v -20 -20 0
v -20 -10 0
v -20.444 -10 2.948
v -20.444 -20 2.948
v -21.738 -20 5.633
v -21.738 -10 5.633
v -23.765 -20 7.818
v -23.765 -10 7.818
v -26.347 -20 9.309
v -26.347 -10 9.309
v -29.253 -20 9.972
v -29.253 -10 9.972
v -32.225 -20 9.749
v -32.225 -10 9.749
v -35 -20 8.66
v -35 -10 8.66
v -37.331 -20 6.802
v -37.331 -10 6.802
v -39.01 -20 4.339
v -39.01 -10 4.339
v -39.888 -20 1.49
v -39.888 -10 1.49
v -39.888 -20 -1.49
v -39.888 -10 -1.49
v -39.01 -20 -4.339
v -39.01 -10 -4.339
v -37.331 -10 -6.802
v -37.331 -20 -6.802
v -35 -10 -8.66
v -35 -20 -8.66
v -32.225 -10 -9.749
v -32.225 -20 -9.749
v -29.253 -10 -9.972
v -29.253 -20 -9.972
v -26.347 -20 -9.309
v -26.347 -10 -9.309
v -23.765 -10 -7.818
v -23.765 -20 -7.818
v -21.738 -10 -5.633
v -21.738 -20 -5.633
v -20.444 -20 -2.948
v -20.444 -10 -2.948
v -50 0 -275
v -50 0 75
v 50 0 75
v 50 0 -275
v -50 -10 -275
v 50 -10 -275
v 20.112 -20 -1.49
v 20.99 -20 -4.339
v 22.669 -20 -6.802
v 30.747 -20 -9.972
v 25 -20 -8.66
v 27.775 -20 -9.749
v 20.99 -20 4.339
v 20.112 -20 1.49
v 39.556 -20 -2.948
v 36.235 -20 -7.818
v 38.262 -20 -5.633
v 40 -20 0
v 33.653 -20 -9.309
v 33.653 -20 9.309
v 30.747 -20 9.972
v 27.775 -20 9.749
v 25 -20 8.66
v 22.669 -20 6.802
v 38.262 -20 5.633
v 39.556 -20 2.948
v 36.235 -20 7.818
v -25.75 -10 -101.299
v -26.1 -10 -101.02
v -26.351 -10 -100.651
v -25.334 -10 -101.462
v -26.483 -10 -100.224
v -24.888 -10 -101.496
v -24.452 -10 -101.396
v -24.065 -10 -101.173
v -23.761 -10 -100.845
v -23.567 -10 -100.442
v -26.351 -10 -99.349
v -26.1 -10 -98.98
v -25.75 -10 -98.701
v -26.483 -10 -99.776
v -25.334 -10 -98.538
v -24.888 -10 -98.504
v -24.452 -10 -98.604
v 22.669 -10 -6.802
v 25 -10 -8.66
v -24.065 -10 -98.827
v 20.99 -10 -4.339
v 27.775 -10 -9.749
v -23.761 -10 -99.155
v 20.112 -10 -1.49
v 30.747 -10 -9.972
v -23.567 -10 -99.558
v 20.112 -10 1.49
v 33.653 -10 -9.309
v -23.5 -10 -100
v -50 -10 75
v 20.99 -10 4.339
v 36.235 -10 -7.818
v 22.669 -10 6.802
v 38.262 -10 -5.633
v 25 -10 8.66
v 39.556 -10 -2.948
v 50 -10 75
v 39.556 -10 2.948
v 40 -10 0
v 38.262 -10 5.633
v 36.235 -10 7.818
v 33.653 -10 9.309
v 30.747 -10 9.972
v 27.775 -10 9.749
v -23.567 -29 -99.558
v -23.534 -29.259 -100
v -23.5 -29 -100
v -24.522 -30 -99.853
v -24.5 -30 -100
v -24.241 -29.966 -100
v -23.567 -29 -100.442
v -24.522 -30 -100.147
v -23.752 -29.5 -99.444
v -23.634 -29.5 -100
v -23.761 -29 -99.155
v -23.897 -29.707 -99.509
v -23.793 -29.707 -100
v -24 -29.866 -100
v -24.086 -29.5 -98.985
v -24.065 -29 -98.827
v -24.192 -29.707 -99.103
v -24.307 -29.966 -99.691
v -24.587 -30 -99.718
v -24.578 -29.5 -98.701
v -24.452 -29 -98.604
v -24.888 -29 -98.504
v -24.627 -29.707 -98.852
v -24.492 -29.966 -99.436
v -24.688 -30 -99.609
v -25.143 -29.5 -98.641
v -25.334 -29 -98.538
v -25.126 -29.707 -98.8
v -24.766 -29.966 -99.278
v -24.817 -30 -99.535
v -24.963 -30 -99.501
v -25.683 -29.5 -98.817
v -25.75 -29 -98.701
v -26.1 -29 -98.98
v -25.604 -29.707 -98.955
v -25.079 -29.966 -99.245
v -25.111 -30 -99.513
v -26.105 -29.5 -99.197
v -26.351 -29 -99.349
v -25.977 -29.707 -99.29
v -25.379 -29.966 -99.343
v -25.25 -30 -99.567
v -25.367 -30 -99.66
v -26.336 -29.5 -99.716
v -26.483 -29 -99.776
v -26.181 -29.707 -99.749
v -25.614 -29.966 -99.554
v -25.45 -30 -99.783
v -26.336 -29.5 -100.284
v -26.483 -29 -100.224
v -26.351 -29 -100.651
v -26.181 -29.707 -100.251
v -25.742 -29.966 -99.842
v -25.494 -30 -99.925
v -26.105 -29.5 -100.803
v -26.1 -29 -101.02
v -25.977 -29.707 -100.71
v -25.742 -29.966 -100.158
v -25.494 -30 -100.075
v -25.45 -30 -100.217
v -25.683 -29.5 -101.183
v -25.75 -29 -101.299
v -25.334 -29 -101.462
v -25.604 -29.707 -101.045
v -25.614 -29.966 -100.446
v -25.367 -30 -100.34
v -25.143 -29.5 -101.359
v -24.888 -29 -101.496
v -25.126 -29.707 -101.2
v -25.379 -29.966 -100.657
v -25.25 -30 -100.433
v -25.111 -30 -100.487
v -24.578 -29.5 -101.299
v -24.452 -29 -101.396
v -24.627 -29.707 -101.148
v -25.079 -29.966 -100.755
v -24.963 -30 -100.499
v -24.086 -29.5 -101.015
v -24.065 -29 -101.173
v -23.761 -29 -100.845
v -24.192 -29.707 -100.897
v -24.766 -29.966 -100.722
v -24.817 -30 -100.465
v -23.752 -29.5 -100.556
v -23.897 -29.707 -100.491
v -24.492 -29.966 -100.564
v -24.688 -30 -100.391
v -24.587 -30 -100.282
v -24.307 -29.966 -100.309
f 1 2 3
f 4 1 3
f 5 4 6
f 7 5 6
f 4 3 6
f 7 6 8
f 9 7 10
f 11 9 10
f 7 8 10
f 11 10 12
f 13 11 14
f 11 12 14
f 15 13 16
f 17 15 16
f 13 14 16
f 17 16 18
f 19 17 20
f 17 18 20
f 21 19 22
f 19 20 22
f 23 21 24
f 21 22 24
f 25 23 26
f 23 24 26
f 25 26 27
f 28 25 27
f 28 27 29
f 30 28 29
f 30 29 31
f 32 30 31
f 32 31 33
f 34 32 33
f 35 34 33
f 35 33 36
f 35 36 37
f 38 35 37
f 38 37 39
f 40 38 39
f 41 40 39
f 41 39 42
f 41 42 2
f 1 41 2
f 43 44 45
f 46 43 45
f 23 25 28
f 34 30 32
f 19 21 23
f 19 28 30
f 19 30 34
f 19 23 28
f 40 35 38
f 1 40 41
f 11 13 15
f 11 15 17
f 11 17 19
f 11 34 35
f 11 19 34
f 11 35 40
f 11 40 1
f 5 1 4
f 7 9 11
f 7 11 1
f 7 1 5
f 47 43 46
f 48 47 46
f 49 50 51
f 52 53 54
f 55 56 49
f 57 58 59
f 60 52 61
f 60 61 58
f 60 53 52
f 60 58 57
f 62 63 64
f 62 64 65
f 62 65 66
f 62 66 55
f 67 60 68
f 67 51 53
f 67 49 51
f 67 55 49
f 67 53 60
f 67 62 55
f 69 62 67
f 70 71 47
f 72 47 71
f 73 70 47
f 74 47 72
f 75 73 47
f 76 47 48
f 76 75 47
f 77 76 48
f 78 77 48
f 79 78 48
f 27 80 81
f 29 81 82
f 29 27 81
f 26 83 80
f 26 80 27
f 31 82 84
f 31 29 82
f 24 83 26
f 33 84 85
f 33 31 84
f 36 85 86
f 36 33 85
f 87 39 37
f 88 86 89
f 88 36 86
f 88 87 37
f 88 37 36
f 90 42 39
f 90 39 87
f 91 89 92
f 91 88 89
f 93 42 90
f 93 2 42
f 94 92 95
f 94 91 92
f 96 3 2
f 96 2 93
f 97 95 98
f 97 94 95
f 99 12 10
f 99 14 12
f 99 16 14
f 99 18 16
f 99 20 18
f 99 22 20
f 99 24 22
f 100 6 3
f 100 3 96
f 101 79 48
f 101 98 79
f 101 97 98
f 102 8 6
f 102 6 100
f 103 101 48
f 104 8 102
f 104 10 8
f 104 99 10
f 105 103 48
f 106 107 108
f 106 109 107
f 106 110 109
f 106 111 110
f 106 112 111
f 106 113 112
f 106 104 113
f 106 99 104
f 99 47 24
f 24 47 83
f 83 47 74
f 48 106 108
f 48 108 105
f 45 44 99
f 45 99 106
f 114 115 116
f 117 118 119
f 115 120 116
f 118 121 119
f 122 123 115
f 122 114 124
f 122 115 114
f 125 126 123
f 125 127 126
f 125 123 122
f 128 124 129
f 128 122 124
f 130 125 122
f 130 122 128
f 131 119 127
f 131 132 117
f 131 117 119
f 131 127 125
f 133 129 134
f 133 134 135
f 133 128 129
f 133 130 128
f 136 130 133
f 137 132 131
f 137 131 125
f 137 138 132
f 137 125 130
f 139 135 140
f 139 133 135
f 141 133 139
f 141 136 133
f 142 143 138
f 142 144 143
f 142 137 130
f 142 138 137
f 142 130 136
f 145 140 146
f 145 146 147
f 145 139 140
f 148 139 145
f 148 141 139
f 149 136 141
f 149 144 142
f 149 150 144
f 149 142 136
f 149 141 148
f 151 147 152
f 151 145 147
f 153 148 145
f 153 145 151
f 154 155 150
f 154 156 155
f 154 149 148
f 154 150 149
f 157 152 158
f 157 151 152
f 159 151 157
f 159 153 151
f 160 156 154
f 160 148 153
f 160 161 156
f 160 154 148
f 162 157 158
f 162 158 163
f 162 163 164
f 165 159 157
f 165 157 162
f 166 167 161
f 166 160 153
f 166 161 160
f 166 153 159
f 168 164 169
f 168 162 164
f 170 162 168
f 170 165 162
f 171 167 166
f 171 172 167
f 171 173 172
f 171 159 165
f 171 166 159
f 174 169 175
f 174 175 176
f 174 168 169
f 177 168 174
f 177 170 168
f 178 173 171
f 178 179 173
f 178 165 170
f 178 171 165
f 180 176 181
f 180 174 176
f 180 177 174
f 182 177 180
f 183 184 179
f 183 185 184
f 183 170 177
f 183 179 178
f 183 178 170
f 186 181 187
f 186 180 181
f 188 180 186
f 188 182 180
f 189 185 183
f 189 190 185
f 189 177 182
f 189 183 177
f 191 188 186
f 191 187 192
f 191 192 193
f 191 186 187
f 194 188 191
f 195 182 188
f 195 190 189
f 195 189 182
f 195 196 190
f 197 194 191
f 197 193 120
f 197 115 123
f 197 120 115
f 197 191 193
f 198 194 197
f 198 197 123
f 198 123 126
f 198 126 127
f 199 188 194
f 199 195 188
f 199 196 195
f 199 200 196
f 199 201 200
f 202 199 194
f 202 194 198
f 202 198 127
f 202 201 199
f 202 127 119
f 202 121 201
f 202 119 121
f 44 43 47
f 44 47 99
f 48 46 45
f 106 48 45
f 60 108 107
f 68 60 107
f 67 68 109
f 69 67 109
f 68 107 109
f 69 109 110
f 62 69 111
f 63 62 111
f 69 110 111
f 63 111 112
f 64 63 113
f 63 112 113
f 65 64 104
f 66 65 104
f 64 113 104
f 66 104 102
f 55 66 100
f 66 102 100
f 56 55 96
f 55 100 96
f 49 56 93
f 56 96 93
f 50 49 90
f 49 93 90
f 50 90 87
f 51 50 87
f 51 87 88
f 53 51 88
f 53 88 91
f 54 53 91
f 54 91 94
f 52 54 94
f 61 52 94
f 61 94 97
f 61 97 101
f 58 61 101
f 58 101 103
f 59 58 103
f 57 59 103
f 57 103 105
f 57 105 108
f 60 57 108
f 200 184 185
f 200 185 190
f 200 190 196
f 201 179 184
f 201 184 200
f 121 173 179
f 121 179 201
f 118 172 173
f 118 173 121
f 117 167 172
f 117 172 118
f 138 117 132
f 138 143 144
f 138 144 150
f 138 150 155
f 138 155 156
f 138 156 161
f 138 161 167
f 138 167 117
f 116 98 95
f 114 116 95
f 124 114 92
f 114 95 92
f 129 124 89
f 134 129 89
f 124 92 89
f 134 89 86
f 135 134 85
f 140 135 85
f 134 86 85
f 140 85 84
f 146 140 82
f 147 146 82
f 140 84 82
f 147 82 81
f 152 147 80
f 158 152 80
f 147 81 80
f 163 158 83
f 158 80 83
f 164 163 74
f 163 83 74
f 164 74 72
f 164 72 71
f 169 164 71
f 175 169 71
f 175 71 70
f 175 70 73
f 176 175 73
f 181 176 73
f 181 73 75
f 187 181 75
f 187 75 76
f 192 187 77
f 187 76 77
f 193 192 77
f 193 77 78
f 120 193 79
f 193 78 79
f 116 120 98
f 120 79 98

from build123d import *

# Parameters (mm, degrees)
F0_W     = 100
F0_H     = 350
F0_R     = 10
F1_DEPTH = 10
F2_DEPTH = 20
F3_R     = 1.5
F4_DEPTH = 20
F5_R     = 1


with BuildPart() as f1:
    # F0 (on Front) → F1 (new body)
    with BuildSketch(Plane.XZ):
        with Locations((0, -100)):
            Rectangle(F0_W, F0_H)
        with Locations((-30, 0)):
            Circle(F0_R, mode=Mode.SUBTRACT)
        with Locations((30, 0)):
            Circle(F0_R, mode=Mode.SUBTRACT)
    extrude(amount=F1_DEPTH)

    # F0 (on Front) → F2 (join)
    with BuildSketch(Plane.XZ):
        with Locations((-30, 0)):
            Circle(F0_R)
        with Locations((30, 0)):
            Circle(F0_R)
    extrude(amount=F2_DEPTH)

    # F3 (on face) → F4 (join)
    with BuildSketch(Plane.XZ.offset(10)):
        with Locations((-25, -100)):
            Circle(F3_R)
    extrude(amount=F4_DEPTH)

    # F5
    f5_edges = [f1.edges().sort_by_distance(p)[0] for p in [
        (-26.5, -30, -100),
    ]]
    fillet(f5_edges, radius=F5_R)


solid = f1.part
